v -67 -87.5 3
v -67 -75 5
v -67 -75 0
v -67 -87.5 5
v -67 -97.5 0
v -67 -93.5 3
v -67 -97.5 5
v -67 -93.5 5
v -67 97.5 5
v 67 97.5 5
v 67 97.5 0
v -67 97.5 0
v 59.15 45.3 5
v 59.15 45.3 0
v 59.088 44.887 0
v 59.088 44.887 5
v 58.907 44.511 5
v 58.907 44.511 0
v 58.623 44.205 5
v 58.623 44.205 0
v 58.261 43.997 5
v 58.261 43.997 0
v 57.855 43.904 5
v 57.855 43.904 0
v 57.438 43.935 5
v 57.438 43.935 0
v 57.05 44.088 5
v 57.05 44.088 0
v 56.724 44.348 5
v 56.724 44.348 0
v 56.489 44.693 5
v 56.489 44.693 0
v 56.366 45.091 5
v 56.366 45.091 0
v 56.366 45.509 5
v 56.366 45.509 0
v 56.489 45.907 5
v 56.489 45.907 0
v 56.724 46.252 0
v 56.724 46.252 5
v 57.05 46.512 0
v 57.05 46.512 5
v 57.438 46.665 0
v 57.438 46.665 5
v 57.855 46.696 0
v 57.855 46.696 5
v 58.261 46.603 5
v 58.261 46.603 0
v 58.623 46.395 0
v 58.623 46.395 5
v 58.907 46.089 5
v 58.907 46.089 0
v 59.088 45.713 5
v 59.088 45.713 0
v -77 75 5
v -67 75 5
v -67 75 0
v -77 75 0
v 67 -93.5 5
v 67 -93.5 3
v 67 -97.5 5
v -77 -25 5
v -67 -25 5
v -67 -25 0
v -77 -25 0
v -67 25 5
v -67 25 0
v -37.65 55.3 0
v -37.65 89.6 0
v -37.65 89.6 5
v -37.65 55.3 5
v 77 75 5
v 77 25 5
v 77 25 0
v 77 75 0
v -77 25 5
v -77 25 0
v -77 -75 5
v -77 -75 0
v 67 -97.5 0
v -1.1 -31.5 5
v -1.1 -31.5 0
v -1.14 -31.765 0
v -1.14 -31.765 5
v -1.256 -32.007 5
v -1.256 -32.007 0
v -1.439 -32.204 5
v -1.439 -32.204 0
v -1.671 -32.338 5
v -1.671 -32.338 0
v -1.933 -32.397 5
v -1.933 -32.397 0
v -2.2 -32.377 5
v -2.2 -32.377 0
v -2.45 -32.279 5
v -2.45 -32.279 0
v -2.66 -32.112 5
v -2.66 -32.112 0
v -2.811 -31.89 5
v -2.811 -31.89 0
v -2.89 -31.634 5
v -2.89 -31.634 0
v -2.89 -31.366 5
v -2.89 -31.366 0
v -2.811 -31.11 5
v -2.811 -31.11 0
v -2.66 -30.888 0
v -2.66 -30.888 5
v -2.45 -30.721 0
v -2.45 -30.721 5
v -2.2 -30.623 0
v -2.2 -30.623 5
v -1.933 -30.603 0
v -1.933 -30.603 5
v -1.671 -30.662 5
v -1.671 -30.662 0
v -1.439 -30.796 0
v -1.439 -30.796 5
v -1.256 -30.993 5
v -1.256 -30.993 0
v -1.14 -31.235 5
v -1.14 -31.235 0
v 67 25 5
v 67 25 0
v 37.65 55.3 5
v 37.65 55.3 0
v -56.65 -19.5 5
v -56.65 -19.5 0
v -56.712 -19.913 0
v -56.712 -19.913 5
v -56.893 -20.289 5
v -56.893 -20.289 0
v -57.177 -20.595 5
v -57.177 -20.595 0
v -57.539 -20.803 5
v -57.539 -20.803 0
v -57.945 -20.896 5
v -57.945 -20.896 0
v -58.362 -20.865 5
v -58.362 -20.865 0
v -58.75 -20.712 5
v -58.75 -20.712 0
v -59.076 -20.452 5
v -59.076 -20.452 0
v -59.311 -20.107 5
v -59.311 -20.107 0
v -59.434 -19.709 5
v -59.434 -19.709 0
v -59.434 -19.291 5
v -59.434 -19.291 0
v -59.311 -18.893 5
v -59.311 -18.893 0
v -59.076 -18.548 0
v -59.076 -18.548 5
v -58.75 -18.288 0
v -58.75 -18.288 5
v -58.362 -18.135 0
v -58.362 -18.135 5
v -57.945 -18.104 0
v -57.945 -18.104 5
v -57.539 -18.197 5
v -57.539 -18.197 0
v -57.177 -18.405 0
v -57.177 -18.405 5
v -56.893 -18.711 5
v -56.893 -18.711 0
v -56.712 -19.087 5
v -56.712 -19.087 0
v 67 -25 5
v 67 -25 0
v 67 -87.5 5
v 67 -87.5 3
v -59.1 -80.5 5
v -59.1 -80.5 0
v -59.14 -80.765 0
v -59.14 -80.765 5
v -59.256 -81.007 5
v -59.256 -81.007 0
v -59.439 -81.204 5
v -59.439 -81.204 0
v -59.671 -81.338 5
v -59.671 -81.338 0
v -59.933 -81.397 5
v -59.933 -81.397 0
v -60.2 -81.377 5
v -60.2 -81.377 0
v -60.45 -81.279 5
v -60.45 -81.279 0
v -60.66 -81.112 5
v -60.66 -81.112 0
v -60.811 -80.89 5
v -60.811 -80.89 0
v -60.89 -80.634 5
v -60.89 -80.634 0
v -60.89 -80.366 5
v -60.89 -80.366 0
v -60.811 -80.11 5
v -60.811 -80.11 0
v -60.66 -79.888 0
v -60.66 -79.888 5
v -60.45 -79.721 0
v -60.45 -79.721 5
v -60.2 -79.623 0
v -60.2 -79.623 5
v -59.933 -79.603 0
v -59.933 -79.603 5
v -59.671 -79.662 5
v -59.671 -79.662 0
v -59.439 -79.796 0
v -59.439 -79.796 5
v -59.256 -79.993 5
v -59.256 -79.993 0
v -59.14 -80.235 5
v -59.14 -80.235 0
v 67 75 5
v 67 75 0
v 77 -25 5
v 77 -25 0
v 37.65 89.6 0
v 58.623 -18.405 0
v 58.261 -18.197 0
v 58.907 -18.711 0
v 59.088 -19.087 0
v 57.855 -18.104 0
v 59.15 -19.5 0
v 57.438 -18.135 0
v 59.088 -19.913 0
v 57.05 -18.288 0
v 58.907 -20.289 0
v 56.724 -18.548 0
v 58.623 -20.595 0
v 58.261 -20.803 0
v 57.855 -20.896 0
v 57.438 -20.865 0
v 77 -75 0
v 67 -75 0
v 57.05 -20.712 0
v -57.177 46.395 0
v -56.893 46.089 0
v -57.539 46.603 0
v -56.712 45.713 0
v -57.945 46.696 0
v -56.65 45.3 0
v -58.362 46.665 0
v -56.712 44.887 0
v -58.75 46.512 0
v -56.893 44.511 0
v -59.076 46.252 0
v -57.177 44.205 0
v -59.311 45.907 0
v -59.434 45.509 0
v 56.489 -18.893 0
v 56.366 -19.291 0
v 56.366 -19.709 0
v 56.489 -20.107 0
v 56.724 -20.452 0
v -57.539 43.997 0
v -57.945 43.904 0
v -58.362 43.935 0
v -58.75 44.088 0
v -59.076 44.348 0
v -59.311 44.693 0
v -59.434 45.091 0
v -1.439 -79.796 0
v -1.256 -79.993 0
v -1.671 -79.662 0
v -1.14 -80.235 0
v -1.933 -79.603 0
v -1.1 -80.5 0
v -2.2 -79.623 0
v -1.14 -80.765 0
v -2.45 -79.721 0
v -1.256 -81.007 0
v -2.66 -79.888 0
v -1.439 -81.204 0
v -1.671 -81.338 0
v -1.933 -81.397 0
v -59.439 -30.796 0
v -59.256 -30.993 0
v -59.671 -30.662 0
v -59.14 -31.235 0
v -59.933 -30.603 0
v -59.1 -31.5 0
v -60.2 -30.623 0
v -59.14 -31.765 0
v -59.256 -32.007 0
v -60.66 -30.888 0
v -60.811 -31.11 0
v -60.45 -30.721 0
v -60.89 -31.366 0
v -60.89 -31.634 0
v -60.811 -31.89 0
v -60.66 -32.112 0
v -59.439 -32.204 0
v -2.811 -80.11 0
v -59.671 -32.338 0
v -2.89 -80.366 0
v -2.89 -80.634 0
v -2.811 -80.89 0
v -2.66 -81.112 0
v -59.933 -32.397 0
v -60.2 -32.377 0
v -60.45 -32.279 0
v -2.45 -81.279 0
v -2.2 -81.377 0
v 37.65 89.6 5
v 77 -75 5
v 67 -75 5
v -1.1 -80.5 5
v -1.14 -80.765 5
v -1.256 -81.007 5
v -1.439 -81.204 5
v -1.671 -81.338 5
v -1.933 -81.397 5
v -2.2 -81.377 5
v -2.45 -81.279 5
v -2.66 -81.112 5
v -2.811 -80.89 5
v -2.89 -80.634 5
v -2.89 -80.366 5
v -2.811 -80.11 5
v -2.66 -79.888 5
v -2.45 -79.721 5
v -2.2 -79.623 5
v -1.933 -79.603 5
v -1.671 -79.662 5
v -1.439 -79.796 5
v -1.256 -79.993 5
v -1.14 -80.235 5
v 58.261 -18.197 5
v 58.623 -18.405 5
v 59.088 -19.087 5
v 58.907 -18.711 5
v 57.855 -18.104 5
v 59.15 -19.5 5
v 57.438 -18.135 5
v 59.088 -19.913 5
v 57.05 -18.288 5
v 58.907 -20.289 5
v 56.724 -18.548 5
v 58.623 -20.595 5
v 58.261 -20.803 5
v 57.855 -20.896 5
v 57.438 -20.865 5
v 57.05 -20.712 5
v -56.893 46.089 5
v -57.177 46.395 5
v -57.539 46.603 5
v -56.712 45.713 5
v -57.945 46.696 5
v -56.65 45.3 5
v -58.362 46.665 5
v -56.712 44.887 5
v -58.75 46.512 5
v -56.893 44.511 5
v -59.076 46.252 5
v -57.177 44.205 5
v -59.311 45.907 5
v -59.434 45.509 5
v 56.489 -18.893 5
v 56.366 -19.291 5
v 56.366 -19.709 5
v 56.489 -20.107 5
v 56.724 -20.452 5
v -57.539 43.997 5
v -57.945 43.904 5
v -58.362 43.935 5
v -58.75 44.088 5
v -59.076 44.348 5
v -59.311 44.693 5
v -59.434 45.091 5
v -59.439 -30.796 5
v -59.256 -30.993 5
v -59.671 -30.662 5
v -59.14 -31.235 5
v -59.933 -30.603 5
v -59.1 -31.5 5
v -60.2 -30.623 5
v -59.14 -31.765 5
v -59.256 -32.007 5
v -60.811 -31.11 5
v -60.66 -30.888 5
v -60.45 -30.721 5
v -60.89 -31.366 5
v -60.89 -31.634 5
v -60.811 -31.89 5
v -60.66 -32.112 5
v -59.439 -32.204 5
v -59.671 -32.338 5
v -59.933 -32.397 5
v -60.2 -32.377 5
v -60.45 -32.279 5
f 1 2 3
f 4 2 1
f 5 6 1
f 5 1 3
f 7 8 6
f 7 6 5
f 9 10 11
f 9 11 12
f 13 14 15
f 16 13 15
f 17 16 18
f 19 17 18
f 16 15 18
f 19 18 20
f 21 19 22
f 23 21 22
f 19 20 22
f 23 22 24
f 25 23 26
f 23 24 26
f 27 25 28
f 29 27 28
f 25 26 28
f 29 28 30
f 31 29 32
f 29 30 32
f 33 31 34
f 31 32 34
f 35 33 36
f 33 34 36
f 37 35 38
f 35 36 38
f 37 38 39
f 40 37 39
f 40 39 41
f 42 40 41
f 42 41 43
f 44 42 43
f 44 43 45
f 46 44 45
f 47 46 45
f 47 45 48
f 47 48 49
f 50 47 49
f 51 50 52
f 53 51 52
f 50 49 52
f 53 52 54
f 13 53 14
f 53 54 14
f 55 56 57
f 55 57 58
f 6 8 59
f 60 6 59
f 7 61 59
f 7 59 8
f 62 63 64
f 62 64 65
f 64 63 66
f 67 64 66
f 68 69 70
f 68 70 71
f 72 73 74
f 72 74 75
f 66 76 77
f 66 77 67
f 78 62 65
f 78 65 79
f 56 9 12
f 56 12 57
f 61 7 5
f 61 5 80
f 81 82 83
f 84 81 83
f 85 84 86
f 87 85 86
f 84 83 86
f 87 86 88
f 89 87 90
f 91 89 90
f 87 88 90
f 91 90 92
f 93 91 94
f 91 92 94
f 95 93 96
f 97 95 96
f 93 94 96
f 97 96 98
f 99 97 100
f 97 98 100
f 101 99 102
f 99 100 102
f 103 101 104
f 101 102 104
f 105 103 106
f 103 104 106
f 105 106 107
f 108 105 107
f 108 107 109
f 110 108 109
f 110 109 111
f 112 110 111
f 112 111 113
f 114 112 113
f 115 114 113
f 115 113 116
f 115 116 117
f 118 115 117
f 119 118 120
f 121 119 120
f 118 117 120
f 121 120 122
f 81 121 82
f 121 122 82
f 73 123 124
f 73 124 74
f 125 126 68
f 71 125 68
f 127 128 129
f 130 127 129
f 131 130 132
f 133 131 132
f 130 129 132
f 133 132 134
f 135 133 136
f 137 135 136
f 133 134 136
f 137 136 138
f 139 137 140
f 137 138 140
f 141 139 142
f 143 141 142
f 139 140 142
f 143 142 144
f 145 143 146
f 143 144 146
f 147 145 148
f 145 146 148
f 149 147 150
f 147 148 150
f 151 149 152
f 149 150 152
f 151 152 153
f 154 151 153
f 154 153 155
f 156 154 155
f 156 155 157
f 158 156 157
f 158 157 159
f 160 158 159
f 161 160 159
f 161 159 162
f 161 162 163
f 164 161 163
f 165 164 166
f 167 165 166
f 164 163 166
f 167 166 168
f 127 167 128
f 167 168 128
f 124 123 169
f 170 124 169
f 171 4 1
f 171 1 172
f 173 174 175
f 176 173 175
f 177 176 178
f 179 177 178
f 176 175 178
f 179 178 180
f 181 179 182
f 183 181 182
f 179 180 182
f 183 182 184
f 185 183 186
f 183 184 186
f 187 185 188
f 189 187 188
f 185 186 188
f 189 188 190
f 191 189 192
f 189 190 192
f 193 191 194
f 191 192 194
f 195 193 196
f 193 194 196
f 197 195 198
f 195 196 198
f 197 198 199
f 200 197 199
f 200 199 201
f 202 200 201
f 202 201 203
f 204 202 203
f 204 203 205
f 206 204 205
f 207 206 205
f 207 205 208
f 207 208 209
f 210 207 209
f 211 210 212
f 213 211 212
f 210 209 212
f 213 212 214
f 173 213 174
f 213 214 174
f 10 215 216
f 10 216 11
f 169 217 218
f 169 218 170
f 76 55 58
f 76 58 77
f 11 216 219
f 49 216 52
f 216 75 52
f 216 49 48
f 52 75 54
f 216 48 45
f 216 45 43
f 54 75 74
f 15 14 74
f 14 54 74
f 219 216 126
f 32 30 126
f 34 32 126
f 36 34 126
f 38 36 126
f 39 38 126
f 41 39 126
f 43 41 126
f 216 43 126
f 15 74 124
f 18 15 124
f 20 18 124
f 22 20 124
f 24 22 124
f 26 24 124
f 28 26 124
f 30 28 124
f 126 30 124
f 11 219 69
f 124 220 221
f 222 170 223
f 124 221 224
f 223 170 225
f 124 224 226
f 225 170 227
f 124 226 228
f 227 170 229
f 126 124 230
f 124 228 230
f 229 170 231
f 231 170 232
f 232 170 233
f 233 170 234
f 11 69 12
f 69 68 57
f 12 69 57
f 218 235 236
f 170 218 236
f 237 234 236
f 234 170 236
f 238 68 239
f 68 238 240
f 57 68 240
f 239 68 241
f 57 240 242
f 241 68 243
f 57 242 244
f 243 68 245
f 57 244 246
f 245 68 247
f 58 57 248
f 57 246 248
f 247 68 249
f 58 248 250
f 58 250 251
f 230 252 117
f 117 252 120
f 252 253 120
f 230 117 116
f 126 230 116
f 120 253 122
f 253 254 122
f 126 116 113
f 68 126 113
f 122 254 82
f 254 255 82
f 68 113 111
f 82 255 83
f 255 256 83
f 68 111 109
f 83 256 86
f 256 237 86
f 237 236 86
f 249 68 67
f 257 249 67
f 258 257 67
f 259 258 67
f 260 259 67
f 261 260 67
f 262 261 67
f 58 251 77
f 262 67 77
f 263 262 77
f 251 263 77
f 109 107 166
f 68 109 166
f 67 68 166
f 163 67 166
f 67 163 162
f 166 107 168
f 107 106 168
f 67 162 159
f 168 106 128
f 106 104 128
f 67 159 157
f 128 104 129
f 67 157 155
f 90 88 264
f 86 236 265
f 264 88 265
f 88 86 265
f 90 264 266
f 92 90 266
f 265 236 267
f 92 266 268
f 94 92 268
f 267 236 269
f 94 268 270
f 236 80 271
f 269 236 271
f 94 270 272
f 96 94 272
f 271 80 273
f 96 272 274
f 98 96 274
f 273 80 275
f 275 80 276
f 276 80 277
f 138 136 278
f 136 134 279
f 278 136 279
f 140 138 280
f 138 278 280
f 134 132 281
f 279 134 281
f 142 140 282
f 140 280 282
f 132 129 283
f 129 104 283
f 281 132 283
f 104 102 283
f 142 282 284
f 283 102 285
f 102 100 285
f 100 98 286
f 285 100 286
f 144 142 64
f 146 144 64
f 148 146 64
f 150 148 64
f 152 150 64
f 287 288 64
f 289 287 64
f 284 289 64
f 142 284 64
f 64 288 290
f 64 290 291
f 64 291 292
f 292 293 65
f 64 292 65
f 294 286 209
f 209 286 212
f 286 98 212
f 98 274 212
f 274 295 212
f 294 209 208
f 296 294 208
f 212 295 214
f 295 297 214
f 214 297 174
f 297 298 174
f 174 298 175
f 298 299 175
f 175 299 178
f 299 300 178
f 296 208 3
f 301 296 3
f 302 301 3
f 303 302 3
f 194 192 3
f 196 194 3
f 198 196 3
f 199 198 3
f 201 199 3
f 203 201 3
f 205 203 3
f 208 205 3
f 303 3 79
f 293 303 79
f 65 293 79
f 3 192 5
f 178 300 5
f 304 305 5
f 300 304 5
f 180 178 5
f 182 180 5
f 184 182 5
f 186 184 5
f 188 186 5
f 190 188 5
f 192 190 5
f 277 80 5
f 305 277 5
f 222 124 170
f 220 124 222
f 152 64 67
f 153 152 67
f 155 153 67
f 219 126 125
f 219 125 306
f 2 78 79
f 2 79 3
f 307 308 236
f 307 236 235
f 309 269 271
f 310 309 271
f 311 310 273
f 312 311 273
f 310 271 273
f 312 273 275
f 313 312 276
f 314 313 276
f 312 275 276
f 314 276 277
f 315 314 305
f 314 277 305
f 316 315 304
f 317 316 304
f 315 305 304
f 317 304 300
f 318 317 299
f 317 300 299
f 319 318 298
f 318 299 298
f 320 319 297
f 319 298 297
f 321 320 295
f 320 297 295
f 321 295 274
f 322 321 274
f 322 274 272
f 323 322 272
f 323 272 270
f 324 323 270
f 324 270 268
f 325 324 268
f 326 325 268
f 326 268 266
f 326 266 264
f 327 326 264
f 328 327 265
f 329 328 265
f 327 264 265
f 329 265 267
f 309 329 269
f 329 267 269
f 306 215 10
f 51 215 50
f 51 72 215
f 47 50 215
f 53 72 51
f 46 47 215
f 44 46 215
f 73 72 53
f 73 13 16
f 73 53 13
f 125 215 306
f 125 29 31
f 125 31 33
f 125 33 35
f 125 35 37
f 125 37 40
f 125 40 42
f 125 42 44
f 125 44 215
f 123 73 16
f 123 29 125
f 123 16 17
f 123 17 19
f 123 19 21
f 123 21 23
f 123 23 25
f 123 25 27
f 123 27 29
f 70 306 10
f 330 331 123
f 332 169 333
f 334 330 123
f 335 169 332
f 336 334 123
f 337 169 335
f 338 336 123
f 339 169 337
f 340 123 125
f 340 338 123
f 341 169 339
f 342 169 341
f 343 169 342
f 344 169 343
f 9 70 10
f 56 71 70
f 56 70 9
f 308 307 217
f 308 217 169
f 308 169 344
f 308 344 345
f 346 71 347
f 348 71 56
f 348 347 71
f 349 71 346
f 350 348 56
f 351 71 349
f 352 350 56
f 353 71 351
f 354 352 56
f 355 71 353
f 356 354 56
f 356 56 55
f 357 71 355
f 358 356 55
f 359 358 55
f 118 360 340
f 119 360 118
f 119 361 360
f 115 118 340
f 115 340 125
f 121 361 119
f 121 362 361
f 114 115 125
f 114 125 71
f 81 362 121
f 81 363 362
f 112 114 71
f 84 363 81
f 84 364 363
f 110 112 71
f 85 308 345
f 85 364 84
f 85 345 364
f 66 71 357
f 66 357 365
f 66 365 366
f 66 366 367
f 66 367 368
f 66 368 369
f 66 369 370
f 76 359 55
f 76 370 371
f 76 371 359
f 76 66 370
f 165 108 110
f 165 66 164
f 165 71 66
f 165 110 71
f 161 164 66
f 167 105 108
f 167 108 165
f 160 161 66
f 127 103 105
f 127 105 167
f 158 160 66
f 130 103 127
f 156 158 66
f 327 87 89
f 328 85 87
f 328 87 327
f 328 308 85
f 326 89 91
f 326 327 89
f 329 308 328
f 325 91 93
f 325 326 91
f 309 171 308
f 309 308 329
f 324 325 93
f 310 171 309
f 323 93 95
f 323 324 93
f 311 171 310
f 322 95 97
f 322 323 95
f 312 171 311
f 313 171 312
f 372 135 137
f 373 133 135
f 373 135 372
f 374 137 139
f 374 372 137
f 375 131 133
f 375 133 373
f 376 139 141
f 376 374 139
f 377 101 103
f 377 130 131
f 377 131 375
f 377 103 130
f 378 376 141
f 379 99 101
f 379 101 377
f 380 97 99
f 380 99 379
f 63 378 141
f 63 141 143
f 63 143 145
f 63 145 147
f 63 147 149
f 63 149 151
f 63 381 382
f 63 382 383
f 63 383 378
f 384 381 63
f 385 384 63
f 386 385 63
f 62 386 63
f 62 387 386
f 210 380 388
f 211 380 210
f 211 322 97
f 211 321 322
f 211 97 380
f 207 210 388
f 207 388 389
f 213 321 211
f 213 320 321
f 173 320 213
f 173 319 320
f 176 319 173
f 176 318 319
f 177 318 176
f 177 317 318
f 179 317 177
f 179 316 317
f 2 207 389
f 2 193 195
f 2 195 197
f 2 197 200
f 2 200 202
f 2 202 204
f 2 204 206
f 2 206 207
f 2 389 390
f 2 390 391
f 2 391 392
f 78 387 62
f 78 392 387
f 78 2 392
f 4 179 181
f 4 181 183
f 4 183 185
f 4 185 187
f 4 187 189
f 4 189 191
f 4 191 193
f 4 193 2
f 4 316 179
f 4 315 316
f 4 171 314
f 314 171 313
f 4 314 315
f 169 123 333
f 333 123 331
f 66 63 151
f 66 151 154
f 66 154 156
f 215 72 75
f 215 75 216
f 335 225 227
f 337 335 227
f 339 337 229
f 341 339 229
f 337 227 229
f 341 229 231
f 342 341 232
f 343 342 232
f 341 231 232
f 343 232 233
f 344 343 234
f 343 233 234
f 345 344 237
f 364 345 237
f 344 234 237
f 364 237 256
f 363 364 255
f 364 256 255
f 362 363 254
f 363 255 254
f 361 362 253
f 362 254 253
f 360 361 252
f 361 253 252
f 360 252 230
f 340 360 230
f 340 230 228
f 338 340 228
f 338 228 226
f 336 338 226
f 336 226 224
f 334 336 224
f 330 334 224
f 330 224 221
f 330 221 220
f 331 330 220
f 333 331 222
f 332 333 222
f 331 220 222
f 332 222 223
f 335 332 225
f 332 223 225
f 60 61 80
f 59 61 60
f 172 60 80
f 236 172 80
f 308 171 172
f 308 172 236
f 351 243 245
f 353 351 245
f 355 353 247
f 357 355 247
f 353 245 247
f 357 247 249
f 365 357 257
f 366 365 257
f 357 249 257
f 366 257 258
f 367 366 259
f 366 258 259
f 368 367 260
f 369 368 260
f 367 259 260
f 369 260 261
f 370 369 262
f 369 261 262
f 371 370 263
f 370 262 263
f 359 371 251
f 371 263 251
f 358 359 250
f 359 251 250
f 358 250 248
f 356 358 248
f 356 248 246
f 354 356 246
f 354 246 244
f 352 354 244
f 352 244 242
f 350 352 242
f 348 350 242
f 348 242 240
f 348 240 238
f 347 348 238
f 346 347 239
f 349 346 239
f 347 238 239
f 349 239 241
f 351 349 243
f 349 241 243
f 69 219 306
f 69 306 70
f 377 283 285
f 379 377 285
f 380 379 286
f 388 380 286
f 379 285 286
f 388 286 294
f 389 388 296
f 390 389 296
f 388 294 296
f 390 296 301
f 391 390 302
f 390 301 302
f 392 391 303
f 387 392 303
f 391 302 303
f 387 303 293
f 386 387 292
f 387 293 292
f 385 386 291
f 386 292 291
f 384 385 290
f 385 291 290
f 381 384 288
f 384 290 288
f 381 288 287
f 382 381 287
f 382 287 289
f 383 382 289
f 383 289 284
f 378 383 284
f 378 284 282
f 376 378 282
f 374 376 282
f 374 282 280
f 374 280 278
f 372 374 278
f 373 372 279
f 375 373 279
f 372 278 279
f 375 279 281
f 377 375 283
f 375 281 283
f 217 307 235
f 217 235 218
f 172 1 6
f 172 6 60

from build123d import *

# Parameters (mm, degrees)
PAD002_DEPTH    = 5
SKETCH002_R     = 0.9
SKETCH002_R_2   = 1.4
POCKET002_DEPTH = 5
SKETCH009_W     = 134
SKETCH009_H     = 6
POCKET009_DEPTH = 2


with BuildPart() as part:
    # Sketch004 → Pad002 (new body)
    with BuildSketch(Plane(origin=(0, 0, 5), x_dir=(1, 0, 0), z_dir=(0, 0, -1))):
        Polygon((-67, 97.5), (67, 97.5), (67, 75), (77, 75), (77, 25), (67, 25), (67, 0), (67, -25), (77, -25), (77, -75), (67, -75), (67, -97.5), (-67, -97.5), (-67, -75), (-77, -75), (-77, -25), (-67, -25), (-67, 0), (-67, 25), (-77, 25), (-77, 75), (-67, 75), align=None)
    extrude(amount=PAD002_DEPTH)

    # Sketch002 (on Face4 of Pad001) → Pocket002 (cut)
    with BuildSketch(Plane(origin=(0, 0, 0), x_dir=(1, 0, 0), z_dir=(0, 0, -1))):
        with Locations((-2, 80.5)):
            Circle(SKETCH002_R)
        with Locations((-60, 80.5)):
            Circle(SKETCH002_R)
        with Locations((-60, 31.5)):
            Circle(SKETCH002_R)
        with Locations((-2, 31.5)):
            Circle(SKETCH002_R)
        with Locations((-58.05, 19.5)):
            Circle(SKETCH002_R_2)
        with Locations((57.75, 19.5)):
            Circle(SKETCH002_R_2)
        with Locations((-58.05, -45.3)):
            Circle(SKETCH002_R_2)
        with Locations((57.75, -45.3)):
            Circle(SKETCH002_R_2)
        Polygon((37.65, -55.3), (37.65, -89.6), (-37.65, -89.6), (-37.65, -55.3), (0, -55.3), align=None)
    extrude(amount=-POCKET002_DEPTH, mode=Mode.SUBTRACT)

    # Sketch009 (on Face4 of Pocket002) → Pocket009 (cut)
    with BuildSketch(Plane.XY.offset(5)):
        with Locations((0, -90.5)):
            Rectangle(SKETCH009_W, SKETCH009_H)
    extrude(amount=-POCKET009_DEPTH, mode=Mode.SUBTRACT)


solid = part.part
